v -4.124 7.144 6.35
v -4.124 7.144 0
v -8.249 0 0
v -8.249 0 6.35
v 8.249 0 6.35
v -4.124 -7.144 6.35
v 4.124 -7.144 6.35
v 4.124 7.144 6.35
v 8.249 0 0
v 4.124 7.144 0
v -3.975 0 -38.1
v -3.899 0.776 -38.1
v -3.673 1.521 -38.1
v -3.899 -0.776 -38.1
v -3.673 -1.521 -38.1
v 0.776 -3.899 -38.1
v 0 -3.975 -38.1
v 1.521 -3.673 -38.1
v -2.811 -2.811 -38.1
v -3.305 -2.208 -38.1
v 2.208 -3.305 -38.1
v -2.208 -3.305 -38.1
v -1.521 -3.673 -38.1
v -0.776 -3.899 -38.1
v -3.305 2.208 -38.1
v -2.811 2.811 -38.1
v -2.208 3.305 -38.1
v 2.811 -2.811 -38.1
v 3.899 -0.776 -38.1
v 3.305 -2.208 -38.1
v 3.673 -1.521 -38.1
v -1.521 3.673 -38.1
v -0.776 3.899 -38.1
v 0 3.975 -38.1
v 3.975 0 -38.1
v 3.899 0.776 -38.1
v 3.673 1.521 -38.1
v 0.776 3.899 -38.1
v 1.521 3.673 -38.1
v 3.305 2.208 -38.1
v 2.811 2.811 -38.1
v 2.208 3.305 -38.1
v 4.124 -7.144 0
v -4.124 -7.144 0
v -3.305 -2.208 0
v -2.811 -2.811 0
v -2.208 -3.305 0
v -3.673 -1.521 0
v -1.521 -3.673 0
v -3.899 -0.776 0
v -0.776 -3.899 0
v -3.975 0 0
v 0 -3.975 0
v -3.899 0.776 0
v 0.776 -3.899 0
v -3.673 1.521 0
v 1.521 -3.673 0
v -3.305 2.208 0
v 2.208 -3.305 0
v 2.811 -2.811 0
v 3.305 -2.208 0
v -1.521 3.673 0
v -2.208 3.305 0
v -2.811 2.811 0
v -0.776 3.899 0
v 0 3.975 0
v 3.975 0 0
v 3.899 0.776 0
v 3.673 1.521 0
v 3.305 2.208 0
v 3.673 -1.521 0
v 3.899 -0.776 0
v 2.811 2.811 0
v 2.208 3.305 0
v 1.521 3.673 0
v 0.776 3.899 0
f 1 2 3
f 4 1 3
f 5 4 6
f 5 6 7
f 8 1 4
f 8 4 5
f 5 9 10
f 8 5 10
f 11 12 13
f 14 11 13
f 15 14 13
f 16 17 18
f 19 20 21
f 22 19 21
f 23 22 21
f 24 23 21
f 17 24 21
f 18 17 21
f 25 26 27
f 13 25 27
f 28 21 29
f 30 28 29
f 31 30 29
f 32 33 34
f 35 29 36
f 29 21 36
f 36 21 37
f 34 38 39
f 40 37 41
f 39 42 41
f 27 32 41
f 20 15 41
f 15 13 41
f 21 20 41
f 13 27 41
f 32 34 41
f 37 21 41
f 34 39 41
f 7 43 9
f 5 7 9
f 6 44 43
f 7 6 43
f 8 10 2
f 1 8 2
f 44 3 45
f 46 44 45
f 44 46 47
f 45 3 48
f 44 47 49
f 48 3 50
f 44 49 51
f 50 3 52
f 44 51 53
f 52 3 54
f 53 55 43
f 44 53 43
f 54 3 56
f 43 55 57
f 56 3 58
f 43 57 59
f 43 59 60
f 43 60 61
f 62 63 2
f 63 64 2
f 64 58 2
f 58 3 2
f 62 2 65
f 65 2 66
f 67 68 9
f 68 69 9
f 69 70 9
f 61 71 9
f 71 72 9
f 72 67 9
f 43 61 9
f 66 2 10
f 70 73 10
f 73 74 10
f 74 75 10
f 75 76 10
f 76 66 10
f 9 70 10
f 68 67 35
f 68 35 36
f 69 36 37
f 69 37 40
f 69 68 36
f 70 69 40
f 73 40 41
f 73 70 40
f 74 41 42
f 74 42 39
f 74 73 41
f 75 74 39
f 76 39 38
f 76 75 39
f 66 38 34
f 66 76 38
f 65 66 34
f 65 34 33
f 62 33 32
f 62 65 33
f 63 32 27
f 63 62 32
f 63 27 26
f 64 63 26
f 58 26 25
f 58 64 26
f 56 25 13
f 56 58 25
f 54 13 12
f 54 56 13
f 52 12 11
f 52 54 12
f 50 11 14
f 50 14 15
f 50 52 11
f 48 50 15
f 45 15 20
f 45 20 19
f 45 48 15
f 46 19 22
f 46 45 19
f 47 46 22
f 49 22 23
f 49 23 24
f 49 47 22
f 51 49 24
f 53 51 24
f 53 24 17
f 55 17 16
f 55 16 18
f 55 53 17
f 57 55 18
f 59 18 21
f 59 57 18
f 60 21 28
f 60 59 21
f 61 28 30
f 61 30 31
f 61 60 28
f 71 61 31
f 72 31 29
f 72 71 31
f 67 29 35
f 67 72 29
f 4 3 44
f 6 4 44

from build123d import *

# Parameters (mm, degrees)
ESQUISSE1_R        = 3.9751
BOSS_EXTRU_1_DEPTH = 38.1
BOSS_EXTRU_2_DEPTH = 6.35


with BuildPart() as part:
    # Esquisse1 → Boss.-Extru.1 (new body)
    with BuildSketch(Plane.XY):
        Circle(ESQUISSE1_R)
    extrude(amount=-BOSS_EXTRU_1_DEPTH)

    # Esquisse2 → Boss.-Extru.2 (add)
    with BuildSketch(Plane.XY):
        Polygon((8.248891971, 0), (4.124445986, 7.14375), (-4.124445986, 7.14375), (-8.248891971, 0), (-4.124445986, -7.14375), (4.124445986, -7.14375), align=None)
    extrude(amount=BOSS_EXTRU_2_DEPTH)


solid = part.part
